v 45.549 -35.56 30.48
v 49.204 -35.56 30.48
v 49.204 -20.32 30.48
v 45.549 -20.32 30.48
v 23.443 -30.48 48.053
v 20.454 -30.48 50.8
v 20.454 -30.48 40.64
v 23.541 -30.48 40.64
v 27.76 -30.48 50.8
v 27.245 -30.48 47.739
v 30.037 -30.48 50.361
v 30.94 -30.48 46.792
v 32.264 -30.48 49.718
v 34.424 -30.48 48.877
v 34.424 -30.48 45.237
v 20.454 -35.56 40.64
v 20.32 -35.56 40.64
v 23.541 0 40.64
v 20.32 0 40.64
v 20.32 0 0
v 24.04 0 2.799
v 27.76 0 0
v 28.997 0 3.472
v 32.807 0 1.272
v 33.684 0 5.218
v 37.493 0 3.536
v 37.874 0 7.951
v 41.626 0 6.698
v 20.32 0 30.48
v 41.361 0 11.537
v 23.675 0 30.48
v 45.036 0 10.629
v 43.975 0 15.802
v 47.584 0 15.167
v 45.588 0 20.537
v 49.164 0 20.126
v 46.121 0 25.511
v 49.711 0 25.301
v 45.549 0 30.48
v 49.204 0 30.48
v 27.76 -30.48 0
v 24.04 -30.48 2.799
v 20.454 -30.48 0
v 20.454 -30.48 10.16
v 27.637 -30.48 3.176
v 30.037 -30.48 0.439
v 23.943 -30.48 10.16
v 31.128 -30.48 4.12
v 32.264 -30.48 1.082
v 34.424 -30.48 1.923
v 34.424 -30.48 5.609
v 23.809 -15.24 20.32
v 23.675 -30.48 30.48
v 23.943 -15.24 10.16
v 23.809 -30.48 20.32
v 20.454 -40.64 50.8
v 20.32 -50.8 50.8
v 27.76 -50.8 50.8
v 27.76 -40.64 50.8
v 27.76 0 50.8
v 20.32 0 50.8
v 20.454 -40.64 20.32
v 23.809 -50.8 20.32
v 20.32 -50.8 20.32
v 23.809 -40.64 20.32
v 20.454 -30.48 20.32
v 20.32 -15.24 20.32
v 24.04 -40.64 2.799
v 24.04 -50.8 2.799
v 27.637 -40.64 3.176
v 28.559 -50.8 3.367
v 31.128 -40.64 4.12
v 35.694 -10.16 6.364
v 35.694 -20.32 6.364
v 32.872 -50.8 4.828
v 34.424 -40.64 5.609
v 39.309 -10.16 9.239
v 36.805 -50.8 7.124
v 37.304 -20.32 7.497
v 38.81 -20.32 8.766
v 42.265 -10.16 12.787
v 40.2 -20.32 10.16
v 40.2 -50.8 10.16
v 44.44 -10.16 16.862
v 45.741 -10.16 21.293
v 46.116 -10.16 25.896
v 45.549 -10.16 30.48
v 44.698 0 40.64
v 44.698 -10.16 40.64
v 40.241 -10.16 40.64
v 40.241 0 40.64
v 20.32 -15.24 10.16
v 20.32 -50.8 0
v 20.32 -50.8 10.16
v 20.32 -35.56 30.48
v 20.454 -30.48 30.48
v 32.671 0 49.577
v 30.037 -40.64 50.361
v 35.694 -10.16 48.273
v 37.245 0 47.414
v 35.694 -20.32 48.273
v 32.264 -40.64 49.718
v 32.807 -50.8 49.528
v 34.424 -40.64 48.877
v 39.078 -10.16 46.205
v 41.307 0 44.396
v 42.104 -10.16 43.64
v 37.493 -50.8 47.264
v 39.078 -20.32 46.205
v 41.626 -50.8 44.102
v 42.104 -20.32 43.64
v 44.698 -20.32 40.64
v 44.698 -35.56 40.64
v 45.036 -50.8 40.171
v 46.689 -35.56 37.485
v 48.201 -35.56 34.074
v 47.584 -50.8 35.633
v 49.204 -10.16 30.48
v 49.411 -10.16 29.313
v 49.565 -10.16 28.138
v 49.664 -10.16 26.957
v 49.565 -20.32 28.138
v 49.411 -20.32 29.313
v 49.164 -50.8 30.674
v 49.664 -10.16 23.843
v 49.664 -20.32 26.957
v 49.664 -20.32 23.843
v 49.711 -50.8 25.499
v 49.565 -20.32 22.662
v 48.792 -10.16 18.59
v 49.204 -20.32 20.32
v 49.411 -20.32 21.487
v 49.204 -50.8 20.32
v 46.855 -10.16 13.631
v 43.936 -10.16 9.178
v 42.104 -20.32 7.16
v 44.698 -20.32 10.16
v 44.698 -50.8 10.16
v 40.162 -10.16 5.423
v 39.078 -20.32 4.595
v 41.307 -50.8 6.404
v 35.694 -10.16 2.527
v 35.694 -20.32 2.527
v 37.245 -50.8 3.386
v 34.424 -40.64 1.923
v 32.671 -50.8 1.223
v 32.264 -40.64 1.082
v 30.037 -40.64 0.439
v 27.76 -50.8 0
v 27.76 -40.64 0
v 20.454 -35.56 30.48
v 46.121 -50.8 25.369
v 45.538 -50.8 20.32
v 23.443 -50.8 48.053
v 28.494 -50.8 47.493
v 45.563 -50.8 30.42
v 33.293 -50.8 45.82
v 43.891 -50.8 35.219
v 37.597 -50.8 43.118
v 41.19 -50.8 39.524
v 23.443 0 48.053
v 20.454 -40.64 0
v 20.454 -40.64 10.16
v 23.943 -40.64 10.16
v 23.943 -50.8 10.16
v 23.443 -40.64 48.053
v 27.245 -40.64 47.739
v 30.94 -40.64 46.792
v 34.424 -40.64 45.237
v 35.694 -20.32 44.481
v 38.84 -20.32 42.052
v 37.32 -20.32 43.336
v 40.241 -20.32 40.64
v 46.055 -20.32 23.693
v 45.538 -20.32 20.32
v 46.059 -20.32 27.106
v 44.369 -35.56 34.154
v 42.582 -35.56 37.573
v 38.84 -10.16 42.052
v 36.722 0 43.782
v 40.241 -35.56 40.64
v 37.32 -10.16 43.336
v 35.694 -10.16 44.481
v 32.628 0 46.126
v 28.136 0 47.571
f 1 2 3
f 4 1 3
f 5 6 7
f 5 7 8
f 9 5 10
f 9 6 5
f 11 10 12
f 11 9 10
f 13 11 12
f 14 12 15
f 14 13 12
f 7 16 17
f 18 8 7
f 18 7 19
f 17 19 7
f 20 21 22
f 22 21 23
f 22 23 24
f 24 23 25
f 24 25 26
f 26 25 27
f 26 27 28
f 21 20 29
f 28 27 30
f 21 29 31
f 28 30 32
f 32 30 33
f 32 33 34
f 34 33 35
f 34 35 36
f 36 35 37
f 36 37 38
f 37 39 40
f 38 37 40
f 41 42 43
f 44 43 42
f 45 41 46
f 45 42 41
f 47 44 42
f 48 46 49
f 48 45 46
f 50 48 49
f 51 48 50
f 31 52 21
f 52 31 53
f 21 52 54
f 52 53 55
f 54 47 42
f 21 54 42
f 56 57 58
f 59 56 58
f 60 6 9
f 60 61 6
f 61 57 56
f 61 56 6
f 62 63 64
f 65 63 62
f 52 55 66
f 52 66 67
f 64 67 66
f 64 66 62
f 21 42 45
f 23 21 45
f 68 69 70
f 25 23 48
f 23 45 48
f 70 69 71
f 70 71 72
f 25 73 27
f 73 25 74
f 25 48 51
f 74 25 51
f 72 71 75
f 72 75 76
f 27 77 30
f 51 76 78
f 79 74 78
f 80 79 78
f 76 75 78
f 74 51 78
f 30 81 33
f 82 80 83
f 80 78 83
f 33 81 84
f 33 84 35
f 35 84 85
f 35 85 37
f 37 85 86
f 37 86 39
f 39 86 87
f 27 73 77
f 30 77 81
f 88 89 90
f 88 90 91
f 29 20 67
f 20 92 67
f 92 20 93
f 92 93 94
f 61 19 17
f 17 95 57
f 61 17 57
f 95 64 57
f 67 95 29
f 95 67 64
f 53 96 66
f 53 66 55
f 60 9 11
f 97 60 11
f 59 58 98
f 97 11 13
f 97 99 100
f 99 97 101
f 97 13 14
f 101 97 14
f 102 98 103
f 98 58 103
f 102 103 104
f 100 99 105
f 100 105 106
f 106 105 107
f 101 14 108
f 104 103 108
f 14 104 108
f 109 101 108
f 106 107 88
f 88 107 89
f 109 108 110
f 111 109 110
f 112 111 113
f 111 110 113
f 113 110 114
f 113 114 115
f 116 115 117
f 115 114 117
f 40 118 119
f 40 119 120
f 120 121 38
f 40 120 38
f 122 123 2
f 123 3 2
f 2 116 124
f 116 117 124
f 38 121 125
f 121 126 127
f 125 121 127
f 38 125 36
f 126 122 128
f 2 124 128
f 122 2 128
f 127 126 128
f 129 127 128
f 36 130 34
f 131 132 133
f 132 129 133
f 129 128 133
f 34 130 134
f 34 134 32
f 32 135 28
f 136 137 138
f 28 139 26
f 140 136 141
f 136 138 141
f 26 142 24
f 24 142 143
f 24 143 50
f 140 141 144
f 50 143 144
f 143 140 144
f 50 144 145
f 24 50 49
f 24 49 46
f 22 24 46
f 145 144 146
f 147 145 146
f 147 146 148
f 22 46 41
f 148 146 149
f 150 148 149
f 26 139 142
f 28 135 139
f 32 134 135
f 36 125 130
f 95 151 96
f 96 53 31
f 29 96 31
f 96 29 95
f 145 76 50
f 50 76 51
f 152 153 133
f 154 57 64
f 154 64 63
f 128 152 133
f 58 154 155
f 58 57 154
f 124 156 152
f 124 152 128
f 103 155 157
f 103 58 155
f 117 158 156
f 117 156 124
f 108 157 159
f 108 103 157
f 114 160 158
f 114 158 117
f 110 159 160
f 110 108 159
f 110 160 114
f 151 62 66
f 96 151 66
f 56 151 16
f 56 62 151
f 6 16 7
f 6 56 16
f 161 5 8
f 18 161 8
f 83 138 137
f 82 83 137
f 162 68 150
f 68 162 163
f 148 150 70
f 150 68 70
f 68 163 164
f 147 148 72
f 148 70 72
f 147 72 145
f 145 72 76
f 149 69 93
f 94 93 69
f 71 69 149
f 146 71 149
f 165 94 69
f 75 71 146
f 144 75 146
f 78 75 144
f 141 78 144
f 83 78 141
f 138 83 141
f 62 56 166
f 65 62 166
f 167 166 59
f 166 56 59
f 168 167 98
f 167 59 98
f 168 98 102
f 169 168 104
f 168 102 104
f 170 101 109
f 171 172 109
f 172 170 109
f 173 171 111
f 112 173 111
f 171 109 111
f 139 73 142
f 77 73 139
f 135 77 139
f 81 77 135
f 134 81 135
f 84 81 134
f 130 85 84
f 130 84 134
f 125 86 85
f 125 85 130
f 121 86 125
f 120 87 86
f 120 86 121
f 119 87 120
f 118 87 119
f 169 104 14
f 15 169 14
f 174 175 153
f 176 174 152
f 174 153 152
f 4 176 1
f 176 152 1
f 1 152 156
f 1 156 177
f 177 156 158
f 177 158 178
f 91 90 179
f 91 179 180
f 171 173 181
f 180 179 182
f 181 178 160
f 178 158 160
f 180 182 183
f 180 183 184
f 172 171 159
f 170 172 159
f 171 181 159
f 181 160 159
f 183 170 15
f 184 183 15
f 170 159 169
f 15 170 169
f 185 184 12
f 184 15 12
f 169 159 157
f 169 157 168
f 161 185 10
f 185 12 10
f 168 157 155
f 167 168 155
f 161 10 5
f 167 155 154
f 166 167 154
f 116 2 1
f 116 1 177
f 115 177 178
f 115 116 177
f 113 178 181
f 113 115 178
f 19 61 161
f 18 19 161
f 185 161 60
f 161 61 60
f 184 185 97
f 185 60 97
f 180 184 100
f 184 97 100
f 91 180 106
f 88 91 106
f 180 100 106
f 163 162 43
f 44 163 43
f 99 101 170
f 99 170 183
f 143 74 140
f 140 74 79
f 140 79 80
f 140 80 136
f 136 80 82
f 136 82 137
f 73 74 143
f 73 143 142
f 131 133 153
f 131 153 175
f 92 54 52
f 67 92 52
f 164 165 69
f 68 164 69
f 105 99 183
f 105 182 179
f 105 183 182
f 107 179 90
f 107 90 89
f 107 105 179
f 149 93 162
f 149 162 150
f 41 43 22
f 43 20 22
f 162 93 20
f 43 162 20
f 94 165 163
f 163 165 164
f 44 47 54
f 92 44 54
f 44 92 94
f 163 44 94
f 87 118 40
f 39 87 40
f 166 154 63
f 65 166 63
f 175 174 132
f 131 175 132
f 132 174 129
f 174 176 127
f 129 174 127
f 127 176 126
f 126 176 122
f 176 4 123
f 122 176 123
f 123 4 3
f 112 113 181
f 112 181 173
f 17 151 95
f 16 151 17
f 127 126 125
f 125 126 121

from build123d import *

# Parameters (mm, degrees)
F0_W     = 50.8
F0_H     = 50.799992591
F1_DEPTH = 50.8
F5_DEPTH = 50.8
F6_W     = 35.56
F6_H     = 10.16
F7_DEPTH = 50.8
F8_W     = 13.97
F8_H     = 10.16
F9_DEPTH = 50.8


with BuildPart() as f1:
    # F0 (on Front) → F1 (new body)
    with BuildSketch(Plane.XZ):
        with Locations((25.4, 25.3999962955)):
            Rectangle(F0_W, F0_H)
    extrude(amount=F1_DEPTH)

    # F4 (on face) → F5 (cut)
    with BuildSketch(Plane.XZ.offset(50.8)):
        Polygon((20.32, 50.799992591), (0, 50.799992591), (0, 0), (13.762652874, 0), (20.32, 0), align=None)
        with BuildLine():
            ThreePointArc((24.0402308716, 2.7991833631), (46.1192378047, 25.7211648984), (23.4431624413, 48.0526536703))
            Line((23.4431624413, 48.0526536703), (24.0402308716, 2.7991833631))
        make_face()
        with BuildLine():
            Line((50.8, 50.799992591), (27.7604617432, 50.799992591))
            ThreePointArc((27.7604617432, 50.799992591), (49.7112248054, 25.3999962955), (27.7604617432, 0))
            Line((27.7604617432, 0), (50.8, 0))
            Line((50.8, 0), (50.8, 50.799992591))
        make_face()
    extrude(amount=-F5_DEPTH, mode=Mode.SUBTRACT)

    # F6 (on offset) → F7 (cut)
    with BuildSketch(Plane.YZ.offset(50.8)):
        with Locations((-17.78, 35.56)):
            Rectangle(F6_W, F6_H)
        with Locations((-33.02, 15.24)):
            Rectangle(F6_W, F6_H)
    extrude(amount=-F7_DEPTH, mode=Mode.SUBTRACT)

    # F8 (on offset) → F9 (cut)
    with BuildSketch(Plane.XY.offset(50.8)):
        with Locations((42.6789473106, -15.24)):
            Rectangle(F8_W, F8_H)
        with Locations((27.4389473106, -35.56)):
            Rectangle(F8_W, F8_H)
    extrude(amount=-F9_DEPTH, mode=Mode.SUBTRACT)


solid = f1.part
